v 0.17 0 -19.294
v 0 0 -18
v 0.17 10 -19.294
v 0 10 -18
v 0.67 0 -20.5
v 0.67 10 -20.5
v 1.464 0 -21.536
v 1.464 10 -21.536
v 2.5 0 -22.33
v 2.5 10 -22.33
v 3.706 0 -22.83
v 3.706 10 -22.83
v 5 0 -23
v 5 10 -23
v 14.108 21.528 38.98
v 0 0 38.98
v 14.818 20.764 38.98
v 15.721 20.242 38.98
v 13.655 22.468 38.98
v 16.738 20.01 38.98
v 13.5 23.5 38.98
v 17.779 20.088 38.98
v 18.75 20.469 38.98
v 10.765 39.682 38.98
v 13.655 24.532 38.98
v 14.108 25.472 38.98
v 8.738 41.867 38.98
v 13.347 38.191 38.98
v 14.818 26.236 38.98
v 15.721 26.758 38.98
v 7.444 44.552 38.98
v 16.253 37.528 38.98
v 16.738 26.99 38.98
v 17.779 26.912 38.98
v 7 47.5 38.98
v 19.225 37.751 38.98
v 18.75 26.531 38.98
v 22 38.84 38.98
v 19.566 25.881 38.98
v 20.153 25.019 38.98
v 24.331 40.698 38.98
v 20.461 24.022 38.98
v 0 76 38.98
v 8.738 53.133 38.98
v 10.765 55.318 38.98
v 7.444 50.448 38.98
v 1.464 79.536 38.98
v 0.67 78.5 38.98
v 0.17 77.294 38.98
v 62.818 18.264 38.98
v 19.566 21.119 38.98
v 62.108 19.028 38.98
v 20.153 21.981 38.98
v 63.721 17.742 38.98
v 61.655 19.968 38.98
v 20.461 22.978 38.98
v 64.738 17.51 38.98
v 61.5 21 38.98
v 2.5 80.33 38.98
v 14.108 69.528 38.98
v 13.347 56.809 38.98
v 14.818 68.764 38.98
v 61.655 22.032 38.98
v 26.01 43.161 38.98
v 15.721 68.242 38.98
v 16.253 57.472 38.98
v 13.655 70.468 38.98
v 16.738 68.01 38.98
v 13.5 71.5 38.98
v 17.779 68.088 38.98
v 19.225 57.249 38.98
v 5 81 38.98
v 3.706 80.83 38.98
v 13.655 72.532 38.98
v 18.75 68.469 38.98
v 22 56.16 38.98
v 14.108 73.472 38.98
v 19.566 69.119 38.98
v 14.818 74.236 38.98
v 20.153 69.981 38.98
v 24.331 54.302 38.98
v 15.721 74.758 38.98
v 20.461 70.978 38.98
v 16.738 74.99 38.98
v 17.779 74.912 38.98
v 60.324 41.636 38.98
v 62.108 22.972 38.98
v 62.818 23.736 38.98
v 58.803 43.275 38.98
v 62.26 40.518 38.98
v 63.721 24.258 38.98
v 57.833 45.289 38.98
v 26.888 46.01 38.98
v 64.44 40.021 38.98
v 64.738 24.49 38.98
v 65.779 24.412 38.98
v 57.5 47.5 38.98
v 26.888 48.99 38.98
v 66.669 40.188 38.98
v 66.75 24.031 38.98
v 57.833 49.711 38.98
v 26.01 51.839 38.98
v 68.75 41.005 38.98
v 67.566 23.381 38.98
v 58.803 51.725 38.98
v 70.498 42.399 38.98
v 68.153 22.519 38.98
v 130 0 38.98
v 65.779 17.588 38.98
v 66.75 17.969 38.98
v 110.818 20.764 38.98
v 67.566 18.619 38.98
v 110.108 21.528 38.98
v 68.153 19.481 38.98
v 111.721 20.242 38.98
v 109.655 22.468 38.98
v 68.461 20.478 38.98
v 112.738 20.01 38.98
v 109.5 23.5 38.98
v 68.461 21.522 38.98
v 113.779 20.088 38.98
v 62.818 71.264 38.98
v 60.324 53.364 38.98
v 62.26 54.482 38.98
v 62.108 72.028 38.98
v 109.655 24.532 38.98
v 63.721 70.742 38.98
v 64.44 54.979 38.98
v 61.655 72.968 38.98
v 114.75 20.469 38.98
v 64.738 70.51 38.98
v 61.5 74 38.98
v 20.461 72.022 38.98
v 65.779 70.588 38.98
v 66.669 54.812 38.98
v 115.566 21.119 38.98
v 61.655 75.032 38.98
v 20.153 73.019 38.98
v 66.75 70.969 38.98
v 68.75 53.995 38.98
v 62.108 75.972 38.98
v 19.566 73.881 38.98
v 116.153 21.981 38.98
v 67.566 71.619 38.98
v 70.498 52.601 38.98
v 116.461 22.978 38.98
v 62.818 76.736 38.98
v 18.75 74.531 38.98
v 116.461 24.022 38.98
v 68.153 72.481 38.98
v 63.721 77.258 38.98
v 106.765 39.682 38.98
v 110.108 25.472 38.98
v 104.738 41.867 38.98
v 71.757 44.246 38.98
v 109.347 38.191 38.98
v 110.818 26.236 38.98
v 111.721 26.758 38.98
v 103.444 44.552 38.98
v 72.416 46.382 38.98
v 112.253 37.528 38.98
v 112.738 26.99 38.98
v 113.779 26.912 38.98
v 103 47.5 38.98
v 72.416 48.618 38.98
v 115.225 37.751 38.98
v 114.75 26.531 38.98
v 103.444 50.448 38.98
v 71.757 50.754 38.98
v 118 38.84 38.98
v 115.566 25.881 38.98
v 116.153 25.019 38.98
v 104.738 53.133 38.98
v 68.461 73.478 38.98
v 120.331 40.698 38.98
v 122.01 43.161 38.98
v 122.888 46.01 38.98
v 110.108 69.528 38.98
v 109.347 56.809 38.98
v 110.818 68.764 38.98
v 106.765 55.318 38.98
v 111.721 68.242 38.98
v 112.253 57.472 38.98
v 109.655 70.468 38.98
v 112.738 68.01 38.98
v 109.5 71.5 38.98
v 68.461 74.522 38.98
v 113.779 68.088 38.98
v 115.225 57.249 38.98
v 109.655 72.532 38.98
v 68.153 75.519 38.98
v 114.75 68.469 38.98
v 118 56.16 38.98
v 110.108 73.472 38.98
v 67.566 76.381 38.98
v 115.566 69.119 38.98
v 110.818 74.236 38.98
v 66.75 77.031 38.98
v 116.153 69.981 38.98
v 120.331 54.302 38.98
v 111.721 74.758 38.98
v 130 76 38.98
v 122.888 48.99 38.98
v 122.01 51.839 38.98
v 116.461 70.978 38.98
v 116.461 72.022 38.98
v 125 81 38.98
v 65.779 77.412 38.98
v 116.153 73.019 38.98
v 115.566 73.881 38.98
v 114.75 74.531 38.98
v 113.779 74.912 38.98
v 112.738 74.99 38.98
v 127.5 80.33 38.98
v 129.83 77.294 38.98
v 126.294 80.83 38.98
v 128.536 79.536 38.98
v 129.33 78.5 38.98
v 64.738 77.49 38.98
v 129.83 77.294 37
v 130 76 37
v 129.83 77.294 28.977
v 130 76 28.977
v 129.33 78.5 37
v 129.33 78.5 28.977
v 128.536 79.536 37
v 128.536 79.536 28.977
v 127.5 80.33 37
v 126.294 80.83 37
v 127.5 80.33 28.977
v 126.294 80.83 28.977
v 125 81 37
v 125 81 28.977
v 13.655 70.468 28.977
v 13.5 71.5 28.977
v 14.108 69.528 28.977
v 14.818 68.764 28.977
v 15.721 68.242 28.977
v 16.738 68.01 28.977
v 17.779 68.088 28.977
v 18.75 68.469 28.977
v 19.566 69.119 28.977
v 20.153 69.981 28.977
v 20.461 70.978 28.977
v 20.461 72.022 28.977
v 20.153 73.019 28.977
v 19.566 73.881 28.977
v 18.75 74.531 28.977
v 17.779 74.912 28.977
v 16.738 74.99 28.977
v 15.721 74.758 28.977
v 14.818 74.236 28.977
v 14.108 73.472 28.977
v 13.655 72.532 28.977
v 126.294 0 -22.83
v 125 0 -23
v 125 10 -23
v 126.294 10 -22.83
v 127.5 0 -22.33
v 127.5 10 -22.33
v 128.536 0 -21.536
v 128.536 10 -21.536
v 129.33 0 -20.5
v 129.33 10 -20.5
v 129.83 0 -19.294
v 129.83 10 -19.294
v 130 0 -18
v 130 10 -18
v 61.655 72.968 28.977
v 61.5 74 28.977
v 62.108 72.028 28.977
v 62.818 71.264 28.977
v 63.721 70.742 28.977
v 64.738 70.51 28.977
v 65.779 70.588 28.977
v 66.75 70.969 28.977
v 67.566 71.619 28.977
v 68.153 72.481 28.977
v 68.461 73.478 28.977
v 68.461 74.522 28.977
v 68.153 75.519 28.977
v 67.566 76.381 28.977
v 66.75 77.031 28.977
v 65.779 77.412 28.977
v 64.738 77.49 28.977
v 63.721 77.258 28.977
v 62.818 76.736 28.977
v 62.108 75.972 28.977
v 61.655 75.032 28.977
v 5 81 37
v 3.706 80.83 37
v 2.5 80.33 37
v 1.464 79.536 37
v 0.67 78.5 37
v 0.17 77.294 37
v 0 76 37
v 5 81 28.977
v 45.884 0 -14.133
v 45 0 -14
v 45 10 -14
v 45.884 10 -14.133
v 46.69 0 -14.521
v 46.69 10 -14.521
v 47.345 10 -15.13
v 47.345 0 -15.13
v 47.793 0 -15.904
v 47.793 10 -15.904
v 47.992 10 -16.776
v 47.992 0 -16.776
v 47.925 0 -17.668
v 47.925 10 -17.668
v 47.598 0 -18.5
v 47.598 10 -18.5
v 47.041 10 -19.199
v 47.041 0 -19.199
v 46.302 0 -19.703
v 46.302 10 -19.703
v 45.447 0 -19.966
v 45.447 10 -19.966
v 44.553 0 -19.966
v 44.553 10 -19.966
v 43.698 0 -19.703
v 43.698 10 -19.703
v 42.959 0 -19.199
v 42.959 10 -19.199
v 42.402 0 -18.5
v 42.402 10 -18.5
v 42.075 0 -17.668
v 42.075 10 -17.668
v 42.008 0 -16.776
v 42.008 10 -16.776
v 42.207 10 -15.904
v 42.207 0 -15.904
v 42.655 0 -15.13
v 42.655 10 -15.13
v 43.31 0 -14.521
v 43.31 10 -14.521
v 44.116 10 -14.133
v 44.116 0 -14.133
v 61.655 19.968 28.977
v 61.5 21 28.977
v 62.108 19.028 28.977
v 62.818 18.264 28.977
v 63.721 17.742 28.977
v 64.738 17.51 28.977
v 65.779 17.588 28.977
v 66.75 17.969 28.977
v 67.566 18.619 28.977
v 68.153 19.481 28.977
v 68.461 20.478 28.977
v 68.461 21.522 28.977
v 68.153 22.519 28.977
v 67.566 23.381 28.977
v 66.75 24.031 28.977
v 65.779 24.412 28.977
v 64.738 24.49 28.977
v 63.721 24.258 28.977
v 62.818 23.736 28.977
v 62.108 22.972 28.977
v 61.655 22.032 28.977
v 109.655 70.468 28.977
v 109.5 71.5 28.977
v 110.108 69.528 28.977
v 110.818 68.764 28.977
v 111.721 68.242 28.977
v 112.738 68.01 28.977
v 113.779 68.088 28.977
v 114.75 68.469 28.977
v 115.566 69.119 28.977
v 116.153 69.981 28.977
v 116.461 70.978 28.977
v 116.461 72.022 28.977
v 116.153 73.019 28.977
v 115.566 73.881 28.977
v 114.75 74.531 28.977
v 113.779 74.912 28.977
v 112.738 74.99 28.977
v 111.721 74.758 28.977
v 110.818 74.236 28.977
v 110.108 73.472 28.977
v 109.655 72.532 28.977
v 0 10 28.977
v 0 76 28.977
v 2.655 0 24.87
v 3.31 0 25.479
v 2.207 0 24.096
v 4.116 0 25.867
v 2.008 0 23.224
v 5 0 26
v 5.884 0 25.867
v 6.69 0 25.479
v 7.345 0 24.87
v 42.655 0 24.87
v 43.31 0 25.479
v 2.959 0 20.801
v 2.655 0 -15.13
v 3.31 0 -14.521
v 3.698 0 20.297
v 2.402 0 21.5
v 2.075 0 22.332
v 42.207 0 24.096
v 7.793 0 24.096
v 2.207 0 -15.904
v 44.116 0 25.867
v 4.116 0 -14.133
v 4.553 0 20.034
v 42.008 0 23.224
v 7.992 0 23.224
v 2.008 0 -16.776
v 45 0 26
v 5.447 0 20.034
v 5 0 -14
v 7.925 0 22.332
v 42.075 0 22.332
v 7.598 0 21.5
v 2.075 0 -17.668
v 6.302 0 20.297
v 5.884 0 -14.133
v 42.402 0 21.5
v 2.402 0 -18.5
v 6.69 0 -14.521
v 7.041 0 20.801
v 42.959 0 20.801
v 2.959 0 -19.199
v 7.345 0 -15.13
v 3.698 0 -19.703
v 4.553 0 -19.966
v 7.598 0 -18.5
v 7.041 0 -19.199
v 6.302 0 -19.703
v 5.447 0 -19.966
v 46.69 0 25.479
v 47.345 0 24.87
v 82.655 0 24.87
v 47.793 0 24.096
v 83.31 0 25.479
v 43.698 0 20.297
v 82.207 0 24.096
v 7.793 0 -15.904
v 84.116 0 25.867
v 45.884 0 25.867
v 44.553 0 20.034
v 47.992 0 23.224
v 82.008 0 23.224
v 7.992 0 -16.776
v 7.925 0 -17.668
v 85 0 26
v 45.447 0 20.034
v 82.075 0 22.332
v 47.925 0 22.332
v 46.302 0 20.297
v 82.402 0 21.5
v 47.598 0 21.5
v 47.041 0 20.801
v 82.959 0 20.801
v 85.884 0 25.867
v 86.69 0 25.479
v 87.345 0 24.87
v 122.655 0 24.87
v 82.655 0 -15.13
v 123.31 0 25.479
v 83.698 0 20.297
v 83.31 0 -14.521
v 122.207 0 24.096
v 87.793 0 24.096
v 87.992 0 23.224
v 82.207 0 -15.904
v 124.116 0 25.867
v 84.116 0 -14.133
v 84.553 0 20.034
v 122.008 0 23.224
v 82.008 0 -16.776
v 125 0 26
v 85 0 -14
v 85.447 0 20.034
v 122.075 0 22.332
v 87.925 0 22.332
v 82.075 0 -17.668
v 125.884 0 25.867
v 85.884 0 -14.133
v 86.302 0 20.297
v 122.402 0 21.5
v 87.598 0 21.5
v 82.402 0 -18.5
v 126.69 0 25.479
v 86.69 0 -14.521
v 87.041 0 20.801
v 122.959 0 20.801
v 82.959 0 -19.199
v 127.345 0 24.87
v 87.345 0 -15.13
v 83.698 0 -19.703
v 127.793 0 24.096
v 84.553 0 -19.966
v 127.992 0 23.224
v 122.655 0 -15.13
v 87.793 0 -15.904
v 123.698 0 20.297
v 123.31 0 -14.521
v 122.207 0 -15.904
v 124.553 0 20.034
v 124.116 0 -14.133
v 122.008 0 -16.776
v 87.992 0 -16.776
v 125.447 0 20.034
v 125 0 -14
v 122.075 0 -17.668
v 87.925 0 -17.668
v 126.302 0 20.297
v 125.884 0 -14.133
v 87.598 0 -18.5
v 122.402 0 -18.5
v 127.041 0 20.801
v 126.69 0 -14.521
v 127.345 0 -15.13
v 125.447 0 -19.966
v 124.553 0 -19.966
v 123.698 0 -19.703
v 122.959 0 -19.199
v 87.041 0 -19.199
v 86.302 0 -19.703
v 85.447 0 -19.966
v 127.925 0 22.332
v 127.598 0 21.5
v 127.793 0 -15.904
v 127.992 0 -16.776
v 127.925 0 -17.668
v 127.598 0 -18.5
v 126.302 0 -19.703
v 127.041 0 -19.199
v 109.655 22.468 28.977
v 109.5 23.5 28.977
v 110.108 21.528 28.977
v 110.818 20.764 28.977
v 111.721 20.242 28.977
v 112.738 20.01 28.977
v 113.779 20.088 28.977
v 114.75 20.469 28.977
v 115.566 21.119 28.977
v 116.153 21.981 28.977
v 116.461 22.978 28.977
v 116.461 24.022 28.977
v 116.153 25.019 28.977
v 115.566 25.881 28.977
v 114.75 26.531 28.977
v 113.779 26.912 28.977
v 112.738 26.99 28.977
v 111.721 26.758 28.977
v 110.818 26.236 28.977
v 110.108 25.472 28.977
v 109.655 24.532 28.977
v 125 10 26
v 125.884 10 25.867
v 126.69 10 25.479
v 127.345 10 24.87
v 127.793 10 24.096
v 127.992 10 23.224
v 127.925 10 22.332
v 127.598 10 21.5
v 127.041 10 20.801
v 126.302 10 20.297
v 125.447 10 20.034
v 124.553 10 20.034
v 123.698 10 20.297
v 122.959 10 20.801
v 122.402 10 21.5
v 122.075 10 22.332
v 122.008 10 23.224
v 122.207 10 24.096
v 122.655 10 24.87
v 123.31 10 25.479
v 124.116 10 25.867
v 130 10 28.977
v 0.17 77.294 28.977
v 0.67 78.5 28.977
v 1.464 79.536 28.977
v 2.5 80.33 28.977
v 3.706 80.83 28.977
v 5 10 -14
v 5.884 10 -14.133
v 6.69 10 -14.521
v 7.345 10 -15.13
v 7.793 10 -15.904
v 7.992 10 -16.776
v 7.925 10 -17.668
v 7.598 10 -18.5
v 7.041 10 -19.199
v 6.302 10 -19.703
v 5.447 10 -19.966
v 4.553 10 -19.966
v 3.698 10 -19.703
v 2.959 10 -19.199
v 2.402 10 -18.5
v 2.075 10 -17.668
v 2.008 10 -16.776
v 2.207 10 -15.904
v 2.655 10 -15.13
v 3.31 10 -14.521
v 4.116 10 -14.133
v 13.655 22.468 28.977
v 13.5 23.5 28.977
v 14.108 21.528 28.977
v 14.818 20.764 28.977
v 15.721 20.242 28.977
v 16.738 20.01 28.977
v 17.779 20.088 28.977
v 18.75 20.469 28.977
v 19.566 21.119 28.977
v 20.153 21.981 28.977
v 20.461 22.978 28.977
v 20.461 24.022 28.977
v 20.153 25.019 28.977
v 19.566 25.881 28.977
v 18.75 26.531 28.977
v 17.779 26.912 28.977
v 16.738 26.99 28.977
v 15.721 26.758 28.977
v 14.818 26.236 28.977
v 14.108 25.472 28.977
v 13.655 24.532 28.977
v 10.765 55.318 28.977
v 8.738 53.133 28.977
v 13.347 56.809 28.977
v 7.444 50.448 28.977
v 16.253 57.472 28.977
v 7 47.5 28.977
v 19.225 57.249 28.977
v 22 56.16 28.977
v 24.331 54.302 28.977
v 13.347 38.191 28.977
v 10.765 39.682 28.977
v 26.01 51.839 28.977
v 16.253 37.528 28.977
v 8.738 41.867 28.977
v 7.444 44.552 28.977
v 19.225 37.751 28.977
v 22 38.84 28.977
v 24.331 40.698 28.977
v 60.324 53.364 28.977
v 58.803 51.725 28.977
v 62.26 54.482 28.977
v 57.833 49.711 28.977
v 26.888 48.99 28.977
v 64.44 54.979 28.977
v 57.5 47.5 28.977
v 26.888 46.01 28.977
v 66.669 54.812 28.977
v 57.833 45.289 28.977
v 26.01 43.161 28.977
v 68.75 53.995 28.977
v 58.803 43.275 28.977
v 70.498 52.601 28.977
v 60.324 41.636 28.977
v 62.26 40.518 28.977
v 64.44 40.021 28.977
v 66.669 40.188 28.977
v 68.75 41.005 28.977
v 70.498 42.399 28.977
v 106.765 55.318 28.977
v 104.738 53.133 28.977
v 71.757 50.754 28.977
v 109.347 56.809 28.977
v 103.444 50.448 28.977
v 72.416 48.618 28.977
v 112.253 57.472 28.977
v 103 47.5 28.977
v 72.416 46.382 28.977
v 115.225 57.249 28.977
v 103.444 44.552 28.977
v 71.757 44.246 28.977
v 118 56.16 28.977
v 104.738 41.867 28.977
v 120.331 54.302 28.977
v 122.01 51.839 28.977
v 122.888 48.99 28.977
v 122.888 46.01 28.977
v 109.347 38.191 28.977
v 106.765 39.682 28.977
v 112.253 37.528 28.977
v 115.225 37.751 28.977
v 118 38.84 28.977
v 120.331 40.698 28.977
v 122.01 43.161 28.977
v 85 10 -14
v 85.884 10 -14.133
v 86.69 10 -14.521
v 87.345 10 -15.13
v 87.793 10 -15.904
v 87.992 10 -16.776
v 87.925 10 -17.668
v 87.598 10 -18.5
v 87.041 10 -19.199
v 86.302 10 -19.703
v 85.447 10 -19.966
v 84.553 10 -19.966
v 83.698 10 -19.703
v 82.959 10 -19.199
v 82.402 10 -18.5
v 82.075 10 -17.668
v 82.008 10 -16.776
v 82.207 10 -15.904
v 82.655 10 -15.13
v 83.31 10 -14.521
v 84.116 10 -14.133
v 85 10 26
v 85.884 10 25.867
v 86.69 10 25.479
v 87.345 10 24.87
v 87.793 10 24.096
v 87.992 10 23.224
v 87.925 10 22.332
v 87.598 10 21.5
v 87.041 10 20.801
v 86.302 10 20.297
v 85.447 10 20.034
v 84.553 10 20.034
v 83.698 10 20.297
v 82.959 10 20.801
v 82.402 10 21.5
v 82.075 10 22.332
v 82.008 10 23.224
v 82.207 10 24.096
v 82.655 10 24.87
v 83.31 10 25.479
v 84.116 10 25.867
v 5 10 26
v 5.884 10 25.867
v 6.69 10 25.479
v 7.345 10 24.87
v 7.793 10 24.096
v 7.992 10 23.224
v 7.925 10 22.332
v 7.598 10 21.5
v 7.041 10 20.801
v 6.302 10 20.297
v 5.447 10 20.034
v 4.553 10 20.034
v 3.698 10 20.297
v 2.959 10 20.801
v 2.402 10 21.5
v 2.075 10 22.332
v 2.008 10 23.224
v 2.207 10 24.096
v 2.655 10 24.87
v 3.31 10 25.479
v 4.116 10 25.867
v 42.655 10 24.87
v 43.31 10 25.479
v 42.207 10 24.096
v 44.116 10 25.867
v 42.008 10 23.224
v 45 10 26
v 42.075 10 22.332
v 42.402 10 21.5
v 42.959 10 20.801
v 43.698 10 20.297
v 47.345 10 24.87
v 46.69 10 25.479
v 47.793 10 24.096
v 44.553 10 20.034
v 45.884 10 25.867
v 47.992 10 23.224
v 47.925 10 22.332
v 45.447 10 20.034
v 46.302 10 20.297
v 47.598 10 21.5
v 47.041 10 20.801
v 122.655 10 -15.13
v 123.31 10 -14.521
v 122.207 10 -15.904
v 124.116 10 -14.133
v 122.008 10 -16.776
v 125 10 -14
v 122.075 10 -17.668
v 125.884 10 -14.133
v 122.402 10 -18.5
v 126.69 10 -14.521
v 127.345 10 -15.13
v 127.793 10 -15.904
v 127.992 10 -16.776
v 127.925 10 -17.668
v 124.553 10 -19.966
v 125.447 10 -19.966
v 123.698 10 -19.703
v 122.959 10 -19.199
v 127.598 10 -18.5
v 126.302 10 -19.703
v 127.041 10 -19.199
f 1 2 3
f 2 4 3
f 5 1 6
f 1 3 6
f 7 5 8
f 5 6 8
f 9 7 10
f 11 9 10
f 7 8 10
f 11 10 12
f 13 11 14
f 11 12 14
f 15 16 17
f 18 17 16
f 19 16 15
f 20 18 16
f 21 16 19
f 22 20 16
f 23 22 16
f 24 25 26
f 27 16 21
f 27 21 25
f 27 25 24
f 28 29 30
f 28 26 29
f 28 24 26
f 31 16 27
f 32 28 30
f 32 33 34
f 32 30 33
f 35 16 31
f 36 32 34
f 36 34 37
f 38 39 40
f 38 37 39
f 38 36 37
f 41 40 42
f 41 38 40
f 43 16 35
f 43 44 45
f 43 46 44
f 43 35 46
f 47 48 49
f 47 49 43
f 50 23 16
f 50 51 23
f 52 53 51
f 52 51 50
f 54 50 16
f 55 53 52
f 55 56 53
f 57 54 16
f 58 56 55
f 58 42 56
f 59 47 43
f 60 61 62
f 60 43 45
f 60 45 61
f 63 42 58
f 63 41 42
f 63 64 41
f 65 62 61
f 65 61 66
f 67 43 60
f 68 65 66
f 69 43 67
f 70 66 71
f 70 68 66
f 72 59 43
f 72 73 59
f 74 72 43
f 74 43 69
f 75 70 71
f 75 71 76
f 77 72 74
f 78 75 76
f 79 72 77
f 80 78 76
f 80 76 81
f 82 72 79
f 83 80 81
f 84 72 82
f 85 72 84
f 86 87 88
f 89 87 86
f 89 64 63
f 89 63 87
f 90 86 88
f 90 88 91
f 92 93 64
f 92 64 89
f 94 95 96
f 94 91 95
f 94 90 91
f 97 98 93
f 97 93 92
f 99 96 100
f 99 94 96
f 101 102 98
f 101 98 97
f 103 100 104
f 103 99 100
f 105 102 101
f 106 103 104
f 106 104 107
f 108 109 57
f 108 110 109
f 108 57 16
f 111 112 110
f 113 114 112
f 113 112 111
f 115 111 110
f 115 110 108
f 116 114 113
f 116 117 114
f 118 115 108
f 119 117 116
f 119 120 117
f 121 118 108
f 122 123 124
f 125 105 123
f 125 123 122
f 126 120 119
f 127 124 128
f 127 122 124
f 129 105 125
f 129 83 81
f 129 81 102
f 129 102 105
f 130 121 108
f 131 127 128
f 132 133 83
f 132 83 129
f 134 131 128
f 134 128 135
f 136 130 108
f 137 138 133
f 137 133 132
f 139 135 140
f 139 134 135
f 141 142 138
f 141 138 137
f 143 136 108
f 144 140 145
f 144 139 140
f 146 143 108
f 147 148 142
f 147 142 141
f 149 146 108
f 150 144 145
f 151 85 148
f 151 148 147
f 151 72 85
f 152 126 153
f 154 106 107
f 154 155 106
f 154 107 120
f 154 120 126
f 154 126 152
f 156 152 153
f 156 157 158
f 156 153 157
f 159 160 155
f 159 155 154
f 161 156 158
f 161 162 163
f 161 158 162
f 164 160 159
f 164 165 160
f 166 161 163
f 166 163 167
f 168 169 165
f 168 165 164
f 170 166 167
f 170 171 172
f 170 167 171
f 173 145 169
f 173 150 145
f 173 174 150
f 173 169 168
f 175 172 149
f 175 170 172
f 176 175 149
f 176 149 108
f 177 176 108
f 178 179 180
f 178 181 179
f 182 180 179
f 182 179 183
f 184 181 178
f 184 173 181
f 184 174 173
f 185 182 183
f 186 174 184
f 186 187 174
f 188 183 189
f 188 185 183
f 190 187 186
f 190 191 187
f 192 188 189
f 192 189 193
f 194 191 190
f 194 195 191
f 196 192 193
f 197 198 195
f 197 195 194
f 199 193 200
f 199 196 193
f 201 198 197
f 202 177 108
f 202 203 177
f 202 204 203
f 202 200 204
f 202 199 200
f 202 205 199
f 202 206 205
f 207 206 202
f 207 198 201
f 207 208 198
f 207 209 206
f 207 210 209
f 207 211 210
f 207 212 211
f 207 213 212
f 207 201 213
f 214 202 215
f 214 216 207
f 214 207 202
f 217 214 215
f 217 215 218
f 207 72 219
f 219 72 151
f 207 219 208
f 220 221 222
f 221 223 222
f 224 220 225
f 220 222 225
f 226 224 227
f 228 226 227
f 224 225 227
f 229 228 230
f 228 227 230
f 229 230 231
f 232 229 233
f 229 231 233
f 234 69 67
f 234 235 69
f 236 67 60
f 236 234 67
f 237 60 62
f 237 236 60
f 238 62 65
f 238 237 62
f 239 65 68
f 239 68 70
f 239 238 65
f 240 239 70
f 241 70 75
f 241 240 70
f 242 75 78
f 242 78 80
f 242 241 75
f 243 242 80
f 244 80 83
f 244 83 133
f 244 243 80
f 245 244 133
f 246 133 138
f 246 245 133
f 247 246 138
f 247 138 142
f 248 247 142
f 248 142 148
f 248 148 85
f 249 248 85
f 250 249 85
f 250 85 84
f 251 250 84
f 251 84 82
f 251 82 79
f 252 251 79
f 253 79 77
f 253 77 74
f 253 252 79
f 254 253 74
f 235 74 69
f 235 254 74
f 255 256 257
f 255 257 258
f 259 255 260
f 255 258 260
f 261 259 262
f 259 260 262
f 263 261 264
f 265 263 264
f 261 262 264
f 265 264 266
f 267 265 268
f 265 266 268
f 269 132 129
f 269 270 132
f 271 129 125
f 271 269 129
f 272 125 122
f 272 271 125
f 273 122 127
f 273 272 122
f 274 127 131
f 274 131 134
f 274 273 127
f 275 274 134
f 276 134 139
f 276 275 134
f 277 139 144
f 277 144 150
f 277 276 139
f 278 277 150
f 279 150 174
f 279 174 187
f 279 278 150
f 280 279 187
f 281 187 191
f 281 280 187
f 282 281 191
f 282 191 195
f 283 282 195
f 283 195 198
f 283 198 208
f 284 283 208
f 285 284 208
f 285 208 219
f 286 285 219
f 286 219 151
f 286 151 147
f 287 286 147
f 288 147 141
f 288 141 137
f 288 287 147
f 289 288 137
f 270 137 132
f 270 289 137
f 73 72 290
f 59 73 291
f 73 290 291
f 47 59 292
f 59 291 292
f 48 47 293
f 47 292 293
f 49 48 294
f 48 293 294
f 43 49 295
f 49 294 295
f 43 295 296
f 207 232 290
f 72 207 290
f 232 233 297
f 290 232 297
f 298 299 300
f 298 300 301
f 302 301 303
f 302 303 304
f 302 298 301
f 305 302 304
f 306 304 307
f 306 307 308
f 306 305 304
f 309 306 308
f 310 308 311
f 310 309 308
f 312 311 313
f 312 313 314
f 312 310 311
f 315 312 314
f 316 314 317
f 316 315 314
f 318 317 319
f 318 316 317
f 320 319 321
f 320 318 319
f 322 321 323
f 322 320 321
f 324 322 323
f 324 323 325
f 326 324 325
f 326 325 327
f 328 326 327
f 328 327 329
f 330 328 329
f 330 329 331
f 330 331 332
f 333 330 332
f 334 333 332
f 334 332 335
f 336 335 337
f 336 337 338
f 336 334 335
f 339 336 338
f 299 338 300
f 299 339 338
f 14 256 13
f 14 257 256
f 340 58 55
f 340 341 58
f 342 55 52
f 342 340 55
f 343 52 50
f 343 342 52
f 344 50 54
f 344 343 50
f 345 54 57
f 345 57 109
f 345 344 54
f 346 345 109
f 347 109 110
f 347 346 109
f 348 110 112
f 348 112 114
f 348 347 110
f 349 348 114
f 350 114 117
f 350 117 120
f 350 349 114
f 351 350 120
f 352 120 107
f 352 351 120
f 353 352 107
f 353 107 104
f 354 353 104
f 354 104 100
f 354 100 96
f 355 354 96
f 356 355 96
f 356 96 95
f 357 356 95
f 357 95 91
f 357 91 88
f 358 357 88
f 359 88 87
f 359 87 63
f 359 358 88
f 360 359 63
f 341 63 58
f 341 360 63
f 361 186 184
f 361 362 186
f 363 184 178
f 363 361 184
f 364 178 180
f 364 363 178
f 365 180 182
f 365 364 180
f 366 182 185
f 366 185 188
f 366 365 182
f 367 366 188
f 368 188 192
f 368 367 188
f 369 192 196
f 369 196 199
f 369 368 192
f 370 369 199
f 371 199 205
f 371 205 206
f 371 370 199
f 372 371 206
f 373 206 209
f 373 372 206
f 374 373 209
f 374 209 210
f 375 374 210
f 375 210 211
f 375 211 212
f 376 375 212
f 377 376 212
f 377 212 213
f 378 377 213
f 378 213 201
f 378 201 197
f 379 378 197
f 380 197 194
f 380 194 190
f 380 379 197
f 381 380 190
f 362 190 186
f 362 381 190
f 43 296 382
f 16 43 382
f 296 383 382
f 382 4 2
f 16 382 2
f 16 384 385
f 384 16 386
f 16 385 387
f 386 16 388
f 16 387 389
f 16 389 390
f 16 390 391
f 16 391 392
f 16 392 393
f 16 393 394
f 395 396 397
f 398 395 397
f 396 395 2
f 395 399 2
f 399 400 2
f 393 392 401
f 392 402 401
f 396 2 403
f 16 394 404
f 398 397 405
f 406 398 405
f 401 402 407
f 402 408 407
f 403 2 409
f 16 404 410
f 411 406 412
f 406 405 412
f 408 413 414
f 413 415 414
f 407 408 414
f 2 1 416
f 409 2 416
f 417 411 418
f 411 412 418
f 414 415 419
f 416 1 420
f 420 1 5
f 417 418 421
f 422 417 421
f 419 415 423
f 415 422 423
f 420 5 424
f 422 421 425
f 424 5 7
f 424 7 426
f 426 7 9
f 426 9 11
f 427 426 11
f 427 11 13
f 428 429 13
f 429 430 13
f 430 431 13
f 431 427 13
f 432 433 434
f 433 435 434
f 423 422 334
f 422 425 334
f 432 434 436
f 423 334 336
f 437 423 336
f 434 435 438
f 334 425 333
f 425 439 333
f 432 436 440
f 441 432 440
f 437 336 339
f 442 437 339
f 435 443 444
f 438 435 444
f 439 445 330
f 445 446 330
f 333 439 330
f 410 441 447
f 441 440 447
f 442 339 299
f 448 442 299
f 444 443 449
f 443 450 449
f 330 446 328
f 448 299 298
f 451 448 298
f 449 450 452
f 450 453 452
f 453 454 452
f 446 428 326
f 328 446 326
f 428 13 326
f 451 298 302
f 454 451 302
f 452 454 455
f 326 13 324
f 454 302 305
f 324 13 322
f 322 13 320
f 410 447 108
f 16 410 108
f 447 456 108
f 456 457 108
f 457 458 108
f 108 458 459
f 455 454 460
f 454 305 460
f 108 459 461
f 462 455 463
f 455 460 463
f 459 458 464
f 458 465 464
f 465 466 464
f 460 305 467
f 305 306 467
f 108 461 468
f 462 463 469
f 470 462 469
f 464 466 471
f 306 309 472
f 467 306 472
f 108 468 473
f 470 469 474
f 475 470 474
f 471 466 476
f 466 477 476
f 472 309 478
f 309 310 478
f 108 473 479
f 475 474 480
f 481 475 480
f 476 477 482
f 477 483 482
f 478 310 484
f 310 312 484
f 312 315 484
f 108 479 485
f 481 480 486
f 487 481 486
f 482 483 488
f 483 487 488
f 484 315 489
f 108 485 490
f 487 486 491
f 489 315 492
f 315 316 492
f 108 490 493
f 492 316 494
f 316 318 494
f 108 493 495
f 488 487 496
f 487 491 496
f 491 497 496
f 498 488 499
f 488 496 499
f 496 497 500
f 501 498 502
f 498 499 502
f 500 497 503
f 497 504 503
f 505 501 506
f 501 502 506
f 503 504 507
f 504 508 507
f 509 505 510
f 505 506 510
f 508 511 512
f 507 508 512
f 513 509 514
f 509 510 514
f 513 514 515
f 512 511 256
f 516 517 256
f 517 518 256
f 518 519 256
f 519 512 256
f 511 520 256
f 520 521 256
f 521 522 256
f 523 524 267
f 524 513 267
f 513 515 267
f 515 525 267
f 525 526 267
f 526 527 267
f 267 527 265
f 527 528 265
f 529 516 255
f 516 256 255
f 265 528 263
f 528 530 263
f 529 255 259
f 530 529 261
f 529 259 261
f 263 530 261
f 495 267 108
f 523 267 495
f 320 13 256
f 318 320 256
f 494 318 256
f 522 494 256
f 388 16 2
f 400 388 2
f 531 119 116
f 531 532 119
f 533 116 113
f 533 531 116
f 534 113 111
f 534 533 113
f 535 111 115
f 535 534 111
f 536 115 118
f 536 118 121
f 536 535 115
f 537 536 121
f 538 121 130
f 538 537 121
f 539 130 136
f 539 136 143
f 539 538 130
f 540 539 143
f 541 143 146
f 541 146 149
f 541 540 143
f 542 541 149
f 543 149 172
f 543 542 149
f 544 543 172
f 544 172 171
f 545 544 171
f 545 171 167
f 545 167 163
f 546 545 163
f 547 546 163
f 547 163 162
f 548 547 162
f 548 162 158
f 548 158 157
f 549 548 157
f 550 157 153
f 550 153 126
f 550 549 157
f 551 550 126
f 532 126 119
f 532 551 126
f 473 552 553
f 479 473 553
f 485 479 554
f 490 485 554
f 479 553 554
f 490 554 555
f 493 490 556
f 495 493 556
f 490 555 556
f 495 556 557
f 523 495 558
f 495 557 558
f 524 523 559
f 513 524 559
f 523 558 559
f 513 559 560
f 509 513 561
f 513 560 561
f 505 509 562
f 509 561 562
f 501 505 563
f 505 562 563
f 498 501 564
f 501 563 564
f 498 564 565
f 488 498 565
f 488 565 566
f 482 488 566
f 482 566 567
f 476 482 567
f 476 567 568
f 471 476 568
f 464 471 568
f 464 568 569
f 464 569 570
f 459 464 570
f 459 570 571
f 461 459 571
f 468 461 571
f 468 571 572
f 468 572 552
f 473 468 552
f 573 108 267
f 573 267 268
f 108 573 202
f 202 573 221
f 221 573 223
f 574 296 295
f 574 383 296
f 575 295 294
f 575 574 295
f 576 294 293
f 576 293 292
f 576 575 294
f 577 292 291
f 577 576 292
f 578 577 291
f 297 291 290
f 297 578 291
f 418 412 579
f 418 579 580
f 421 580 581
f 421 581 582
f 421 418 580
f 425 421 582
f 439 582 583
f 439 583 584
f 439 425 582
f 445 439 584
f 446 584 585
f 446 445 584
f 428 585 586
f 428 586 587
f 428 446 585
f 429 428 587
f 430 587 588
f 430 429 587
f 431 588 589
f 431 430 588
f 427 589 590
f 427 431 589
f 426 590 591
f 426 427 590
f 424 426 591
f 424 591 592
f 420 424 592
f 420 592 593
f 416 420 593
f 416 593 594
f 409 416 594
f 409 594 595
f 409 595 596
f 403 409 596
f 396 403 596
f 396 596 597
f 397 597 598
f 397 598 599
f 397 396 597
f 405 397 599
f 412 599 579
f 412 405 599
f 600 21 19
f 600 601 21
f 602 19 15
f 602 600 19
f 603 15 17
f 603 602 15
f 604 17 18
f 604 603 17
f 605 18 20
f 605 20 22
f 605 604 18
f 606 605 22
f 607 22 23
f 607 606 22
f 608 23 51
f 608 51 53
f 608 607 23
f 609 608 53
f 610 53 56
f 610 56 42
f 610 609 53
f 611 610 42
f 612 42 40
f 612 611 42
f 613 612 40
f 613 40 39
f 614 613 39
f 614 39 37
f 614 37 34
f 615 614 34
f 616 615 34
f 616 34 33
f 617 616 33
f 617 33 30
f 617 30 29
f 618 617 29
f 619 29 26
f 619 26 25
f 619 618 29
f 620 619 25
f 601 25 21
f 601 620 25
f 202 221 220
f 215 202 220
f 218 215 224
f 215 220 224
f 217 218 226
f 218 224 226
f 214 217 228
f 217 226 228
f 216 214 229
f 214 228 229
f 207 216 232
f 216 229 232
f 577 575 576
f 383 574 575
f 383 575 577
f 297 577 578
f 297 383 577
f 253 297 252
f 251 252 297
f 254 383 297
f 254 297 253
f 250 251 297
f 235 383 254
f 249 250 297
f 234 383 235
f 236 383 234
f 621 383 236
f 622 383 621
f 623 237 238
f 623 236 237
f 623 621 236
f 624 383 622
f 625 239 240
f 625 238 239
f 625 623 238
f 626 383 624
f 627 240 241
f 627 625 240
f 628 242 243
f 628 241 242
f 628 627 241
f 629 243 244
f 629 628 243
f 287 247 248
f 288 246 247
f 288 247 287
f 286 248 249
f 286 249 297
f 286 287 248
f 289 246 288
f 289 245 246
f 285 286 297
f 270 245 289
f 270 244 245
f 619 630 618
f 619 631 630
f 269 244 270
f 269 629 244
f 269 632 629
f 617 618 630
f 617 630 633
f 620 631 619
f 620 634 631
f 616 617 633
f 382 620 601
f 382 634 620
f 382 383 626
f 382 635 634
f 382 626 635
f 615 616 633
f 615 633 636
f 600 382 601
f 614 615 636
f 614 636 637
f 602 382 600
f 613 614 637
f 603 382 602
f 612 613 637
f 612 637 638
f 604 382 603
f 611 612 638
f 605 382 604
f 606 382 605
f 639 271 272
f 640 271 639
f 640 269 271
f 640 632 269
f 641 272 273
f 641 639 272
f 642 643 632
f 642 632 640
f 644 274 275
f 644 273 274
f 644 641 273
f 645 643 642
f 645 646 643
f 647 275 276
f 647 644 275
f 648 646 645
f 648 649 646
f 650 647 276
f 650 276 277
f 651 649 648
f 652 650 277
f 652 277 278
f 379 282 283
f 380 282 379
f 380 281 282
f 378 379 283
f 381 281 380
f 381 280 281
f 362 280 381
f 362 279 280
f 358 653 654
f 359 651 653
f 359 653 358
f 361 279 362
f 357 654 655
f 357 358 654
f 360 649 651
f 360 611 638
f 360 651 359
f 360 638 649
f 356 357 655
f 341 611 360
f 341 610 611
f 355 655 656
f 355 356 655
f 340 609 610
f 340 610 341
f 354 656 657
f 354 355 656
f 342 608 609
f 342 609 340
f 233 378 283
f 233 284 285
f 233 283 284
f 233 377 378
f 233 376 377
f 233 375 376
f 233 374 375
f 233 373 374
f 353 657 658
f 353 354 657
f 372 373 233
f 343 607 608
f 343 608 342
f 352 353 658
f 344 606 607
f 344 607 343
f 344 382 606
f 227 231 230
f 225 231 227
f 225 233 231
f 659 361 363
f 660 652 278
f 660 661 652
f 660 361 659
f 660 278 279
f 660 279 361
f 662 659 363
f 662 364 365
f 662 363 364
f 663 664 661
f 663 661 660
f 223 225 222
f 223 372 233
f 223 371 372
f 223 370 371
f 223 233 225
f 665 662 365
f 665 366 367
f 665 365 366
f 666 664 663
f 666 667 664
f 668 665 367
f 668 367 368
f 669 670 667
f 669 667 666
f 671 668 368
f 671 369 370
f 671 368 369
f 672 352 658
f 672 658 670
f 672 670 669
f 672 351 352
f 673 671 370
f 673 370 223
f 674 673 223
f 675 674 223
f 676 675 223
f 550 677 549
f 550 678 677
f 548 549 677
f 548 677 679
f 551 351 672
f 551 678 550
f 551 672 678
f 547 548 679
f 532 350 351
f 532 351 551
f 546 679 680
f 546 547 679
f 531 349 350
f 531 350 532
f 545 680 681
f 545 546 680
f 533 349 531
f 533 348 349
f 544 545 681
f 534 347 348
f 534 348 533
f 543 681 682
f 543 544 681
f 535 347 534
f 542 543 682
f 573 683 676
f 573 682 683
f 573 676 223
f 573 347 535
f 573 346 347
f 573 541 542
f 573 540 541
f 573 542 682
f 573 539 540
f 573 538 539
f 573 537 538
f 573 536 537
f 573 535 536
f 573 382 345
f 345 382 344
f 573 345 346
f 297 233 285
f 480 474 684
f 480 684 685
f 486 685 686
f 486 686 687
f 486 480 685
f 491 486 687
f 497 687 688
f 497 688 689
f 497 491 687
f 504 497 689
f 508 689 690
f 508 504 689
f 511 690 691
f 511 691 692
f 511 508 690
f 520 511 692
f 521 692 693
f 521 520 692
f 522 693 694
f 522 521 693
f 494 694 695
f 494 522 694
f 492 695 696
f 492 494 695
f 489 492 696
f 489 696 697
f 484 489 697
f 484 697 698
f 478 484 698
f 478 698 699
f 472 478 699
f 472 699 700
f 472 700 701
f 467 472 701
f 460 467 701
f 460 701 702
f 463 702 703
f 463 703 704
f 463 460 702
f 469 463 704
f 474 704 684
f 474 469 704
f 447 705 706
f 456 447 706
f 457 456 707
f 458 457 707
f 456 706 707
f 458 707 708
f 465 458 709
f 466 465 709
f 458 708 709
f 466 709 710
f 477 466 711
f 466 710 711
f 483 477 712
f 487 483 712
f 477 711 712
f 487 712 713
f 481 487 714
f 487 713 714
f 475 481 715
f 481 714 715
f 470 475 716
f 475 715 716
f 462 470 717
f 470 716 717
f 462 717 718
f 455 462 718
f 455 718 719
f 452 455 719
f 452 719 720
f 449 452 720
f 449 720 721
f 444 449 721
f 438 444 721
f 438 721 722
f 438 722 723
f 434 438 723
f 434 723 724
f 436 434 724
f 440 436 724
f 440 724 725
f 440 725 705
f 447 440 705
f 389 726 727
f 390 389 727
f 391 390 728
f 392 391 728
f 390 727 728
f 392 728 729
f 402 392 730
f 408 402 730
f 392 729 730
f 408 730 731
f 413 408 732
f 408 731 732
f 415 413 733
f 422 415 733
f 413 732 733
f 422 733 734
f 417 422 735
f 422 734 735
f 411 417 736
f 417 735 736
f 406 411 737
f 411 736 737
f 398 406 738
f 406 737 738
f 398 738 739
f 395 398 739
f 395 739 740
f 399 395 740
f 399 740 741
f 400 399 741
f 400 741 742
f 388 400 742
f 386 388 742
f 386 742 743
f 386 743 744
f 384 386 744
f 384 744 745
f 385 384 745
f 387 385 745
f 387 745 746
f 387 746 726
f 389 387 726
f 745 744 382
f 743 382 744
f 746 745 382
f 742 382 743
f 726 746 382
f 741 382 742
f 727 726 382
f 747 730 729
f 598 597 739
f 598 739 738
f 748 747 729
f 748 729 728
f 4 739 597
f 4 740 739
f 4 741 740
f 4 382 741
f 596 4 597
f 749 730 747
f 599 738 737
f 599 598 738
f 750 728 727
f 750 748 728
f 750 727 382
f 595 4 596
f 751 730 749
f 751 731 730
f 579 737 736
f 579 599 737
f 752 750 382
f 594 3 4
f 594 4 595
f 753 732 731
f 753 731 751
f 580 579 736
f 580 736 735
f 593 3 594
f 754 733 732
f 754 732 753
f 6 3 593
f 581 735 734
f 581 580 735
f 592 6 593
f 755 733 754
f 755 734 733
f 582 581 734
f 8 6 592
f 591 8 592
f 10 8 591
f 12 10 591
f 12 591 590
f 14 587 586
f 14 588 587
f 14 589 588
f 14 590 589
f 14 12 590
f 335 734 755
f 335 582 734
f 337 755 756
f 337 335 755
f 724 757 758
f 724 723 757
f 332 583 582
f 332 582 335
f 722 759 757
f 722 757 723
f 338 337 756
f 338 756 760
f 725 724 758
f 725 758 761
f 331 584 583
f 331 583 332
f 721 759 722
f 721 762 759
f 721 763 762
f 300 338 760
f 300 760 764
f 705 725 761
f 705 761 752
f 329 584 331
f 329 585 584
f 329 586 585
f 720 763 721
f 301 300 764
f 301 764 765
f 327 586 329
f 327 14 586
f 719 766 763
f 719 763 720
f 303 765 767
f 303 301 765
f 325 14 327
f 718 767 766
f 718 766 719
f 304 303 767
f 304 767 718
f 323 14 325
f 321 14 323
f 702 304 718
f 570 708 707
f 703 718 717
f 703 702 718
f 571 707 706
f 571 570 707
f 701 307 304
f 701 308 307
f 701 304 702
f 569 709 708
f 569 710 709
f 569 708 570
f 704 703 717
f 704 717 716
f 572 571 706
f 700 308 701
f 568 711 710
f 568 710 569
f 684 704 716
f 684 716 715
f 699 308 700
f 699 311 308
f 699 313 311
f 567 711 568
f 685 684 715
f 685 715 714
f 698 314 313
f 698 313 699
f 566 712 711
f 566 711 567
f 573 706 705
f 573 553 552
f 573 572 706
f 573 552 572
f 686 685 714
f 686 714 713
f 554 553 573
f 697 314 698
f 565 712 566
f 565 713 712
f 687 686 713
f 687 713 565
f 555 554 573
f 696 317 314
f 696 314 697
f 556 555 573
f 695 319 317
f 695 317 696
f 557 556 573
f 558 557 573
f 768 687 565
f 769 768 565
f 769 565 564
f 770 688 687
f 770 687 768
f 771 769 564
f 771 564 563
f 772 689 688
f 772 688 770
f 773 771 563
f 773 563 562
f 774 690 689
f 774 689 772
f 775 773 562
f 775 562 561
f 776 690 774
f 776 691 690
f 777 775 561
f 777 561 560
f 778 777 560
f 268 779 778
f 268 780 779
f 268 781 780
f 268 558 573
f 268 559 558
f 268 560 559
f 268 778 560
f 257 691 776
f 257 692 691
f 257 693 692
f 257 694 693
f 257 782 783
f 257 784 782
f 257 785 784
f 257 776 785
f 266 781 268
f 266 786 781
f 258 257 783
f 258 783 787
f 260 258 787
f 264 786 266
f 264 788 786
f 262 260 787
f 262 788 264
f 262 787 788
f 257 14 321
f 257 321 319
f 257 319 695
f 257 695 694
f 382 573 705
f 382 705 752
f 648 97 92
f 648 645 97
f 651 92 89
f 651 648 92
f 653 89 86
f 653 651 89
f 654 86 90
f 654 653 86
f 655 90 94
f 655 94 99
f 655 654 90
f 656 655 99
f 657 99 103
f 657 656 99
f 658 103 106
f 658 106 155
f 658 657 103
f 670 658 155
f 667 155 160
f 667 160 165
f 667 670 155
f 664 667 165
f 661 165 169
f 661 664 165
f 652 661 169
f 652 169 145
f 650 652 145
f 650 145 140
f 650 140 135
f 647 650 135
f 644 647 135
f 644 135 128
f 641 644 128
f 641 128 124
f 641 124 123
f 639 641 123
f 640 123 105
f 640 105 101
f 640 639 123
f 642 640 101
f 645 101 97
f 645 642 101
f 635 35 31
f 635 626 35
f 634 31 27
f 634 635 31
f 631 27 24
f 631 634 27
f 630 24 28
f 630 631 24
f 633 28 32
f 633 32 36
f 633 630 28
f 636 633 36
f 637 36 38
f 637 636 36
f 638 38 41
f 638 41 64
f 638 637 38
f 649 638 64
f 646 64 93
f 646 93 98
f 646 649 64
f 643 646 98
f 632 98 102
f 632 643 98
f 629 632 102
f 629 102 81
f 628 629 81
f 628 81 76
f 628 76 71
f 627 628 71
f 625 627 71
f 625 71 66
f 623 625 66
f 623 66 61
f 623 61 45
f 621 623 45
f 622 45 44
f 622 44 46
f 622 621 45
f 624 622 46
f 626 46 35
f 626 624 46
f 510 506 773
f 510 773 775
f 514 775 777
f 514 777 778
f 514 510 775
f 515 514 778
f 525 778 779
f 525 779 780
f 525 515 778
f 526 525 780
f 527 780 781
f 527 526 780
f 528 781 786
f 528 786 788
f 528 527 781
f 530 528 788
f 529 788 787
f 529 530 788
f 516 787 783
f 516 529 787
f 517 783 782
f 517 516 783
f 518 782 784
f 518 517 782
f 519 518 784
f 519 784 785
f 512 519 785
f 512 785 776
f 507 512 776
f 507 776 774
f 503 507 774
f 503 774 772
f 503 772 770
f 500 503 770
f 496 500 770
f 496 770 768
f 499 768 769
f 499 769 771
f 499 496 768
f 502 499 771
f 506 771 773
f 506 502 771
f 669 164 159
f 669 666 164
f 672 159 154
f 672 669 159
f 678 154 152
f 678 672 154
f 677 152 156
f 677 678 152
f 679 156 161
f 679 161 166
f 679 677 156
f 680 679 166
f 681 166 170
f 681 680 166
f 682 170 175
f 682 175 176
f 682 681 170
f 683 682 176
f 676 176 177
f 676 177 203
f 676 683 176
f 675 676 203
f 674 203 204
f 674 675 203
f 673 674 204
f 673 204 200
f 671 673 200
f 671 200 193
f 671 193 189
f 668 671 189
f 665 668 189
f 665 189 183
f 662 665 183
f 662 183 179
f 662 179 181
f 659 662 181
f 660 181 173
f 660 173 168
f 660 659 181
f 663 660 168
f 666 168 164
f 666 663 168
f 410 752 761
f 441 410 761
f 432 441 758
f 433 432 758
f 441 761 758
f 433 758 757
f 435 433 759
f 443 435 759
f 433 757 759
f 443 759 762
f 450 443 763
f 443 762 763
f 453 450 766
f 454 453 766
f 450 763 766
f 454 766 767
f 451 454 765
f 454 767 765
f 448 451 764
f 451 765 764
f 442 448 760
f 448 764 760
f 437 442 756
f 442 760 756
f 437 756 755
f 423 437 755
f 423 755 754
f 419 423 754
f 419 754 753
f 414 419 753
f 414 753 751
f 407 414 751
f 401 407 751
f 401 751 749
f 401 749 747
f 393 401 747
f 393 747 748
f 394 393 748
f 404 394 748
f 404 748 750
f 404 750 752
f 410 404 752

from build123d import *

# Parameters (mm, degrees)
SKETCH1_R           = 3
SKETCH1_W           = 130
SKETCH1_H           = 10
BOSS_EXTRUDE1_DEPTH = 10
SKETCH2_W           = 130
SKETCH2_H           = 8.023003322
BOSS_EXTRUDE2_DEPTH = 75
SKETCH3_R           = 7.5
SKETCH3_R_2         = 3.5
SKETCH3_R_3         = 10
CUT_EXTRUDE1_DEPTH  = 75
SKETCH4_R           = 3.5
BOSS_EXTRUDE3_DEPTH = 10
SKETCH5_R           = 3.5
CUT_EXTRUDE2_DEPTH  = 10
SKETCH7_W           = 130
SKETCH7_H           = 8.023003322
CUT_EXTRUDE3_DEPTH  = 4
FILLET2_R           = 5
SKETCH8_W           = 4.676136813
SKETCH8_H           = 81
CUT_EXTRUDE4_DEPTH  = 500
SKETCH9_R           = 3
CUT_EXTRUDE5_DEPTH  = 500
SKETCH11_W          = 130
SKETCH11_H          = 10
CUT_EXTRUDE6_DEPTH  = 40
FILLET3_R           = 5
FILLET4_R           = 5
SKETCH12_R          = 3.5
SKETCH12_R_2        = 10
SKETCH12_R_3        = 7.5
BOSS_EXTRUDE4_DEPTH = 1.98


with BuildPart() as part:
    # Sketch1 → Boss-Extrude1 (new body)
    # profile 1 of 3: a face of its own
    with BuildSketch(Plane(origin=(0, 0, 0), x_dir=(1, 0, 0), z_dir=(0, 1, 0))):
        Polygon((0, 63), (0, 0), (5, 0), (130, 0), (130, 63), align=None)
        with Locations(Location((5, 17, 0), (0, 0, 270))):
            Circle(SKETCH1_R, mode=Mode.SUBTRACT)
        with Locations(Location((45, 17, 0), (0, 0, 270))):
            Circle(SKETCH1_R, mode=Mode.SUBTRACT)
        with Locations(Location((5, 57, 0), (0, 0, 270))):
            Circle(SKETCH1_R, mode=Mode.SUBTRACT)
        with Locations(Location((45, 57, 0), (0, 0, 270))):
            Circle(SKETCH1_R, mode=Mode.SUBTRACT)
        with Locations(Location((85, 17, 0), (0, 0, 270))):
            Circle(SKETCH1_R, mode=Mode.SUBTRACT)
        with Locations(Location((125, 17, 0), (0, 0, 270))):
            Circle(SKETCH1_R, mode=Mode.SUBTRACT)
        with Locations(Location((85, 57, 0), (0, 0, 270))):
            Circle(SKETCH1_R, mode=Mode.SUBTRACT)
        with Locations(Location((125, 57, 0), (0, 0, 270))):
            Circle(SKETCH1_R, mode=Mode.SUBTRACT)
    # profile 2 of 3: a face of its own
    with BuildSketch(Plane(origin=(0, 0, 0), x_dir=(1, 0, 0), z_dir=(0, 1, 0))):
        Polygon((5, 0), (0, 0), (0, -27), (130, -27), (130, 0), align=None)
    # profile 3 of 3: a face of its own
    with BuildSketch(Plane(origin=(0, 0, 0), x_dir=(1, 0, 0), z_dir=(0, 1, 0))):
        with Locations((65, -32)):
            Rectangle(SKETCH1_W, SKETCH1_H)
    extrude(amount=BOSS_EXTRUDE1_DEPTH)

    # Sketch2 → Boss-Extrude2 (add)
    with BuildSketch(Plane(origin=(0, 10, 0), x_dir=(1, 0, 0), z_dir=(0, 1, 0))):
        with Locations((65, -32.988498339)):
            Rectangle(SKETCH2_W, SKETCH2_H)
    extrude(amount=BOSS_EXTRUDE2_DEPTH)

    # Sketch3 → Cut-Extrude1 (cut)
    with BuildSketch(Plane(origin=(0, 0, 28.976996678), x_dir=(-1, 0, 0), z_dir=(0, 0, -1))):
        with Locations((-65, 47.5)):
            Circle(SKETCH3_R)
        with Locations((-65, 74)):
            Circle(SKETCH3_R_2)
        with Locations((-17, 71.4)):
            Circle(SKETCH3_R_2)
        with Locations((-17, 23.6)):
            Circle(SKETCH3_R_2)
        with Locations((-17, 47.5)):
            Circle(SKETCH3_R_3)
        with Locations((-65, 21)):
            Circle(SKETCH3_R_2)
        with Locations((-113, 23.6)):
            Circle(SKETCH3_R_2)
        with Locations((-113, 71.4)):
            Circle(SKETCH3_R_2)
        with Locations((-113, 47.5)):
            Circle(SKETCH3_R_3)
    extrude(amount=-CUT_EXTRUDE1_DEPTH, mode=Mode.SUBTRACT)

    # Sketch4 → Boss-Extrude3 (add)
    with BuildSketch(Plane(origin=(0, 0, 28.976996678), x_dir=(-1, 0, 0), z_dir=(0, 0, -1))):
        with Locations((-17, 71.4)):
            Circle(SKETCH4_R)
        with Locations((-17, 23.6)):
            Circle(SKETCH4_R)
        with Locations((-113, 71.4)):
            Circle(SKETCH4_R)
        with Locations((-113, 23.6)):
            Circle(SKETCH4_R)
        with Locations((-65, 74)):
            Circle(SKETCH4_R)
        with Locations((-65, 21)):
            Circle(SKETCH4_R)
    extrude(amount=-BOSS_EXTRUDE3_DEPTH)

    # Sketch5 → Cut-Extrude2 (cut)
    with BuildSketch(Plane(origin=(0, 0, 28.976996678), x_dir=(-1, 0, 0), z_dir=(0, 0, -1))):
        with Locations((-113, 71.5)):
            Circle(SKETCH5_R)
        with Locations((-113, 23.5)):
            Circle(SKETCH5_R)
        with Locations((-17, 71.5)):
            Circle(SKETCH5_R)
        with Locations((-17, 23.5)):
            Circle(SKETCH5_R)
        with Locations((-65, 74)):
            Circle(SKETCH5_R)
        with Locations((-65, 21)):
            Circle(SKETCH5_R)
    extrude(amount=-CUT_EXTRUDE2_DEPTH, mode=Mode.SUBTRACT)

    # Sketch7 → Cut-Extrude3 (cut)
    with BuildSketch(Plane(origin=(0, 85, 0), x_dir=(1, 0, 0), z_dir=(0, 1, 0))):
        with Locations((65, -32.988498339)):
            Rectangle(SKETCH7_W, SKETCH7_H)
    extrude(amount=-CUT_EXTRUDE3_DEPTH, mode=Mode.SUBTRACT)

    # Fillet2
    fillet2_edges = [part.edges().sort_by_distance(p)[0] for p in [
        (130, 5, -63),
        (0, 5, -63),
        (0, 81, 32.988498339),
        (130, 81, 32.988498339),
    ]]
    fillet(fillet2_edges, radius=FILLET2_R)

    # Sketch8 → Cut-Extrude4 (cut)
    with BuildSketch(Plane.ZY):
        with Locations((39.338068406, 40.5)):
            Rectangle(SKETCH8_W, SKETCH8_H)
    extrude(amount=-CUT_EXTRUDE4_DEPTH, mode=Mode.SUBTRACT)

    # Sketch9 → Cut-Extrude5 (cut)
    with BuildSketch(Plane(origin=(0, 10, 0), x_dir=(1, 0, 0), z_dir=(0, 1, 0))):
        with Locations(Location((5, -23, 0), (0, 0, 270))):
            Circle(SKETCH9_R)
        with Locations(Location((45, -23, 0), (0, 0, 270))):
            Circle(SKETCH9_R)
        with Locations(Location((85, -23, 0), (0, 0, 270))):
            Circle(SKETCH9_R)
        with Locations(Location((125, -23, 0), (0, 0, 270))):
            Circle(SKETCH9_R)
    extrude(amount=-CUT_EXTRUDE5_DEPTH, mode=Mode.SUBTRACT)

    # Sketch11 → Cut-Extrude6 (cut)
    with BuildSketch(Plane(origin=(0, 0, -63), x_dir=(-1, 0, 0), z_dir=(0, 0, -1))):
        with Locations((-65, 5)):
            Rectangle(SKETCH11_W, SKETCH11_H)
    extrude(amount=-CUT_EXTRUDE6_DEPTH, mode=Mode.SUBTRACT)

    # Fillet3
    fillet3_edges = [part.edges().sort_by_distance(p)[0] for p in [
        (0, 5, -23),
    ]]
    fillet(fillet3_edges, radius=FILLET3_R)

    # Fillet4
    fillet4_edges = [part.edges().sort_by_distance(p)[0] for p in [
        (130, 5, -23),
    ]]
    fillet(fillet4_edges, radius=FILLET4_R)

    # Sketch12 → Boss-Extrude4 (add)
    # profile 1 of 3: a face of its own
    with BuildSketch(Plane.XY.offset(37)):
        with BuildLine():
            Line((125, 81), (5, 81))
            ThreePointArc((5, 81), (8.535533906, 79.535533906), (10, 76))
            ThreePointArc((10, 76), (5, 71), (0, 76))
            Line((0, 76), (0, 0))
            Line((0, 0), (130, 0))
            Line((130, 0), (130, 76))
            ThreePointArc((130, 76), (121.464466094, 72.464466094), (125, 81))
        make_face()
        with Locations(Location((17, 23.5, 0), (0, 0, 180))):
            Circle(SKETCH12_R, mode=Mode.SUBTRACT)
        with Locations(Location((65, 21, 0), (0, 0, 180))):
            Circle(SKETCH12_R, mode=Mode.SUBTRACT)
        with Locations(Location((113, 23.5, 0), (0, 0, 180))):
            Circle(SKETCH12_R, mode=Mode.SUBTRACT)
        with Locations(Location((17, 47.5, 0), (0, 0, 180))):
            Circle(SKETCH12_R_2, mode=Mode.SUBTRACT)
        with Locations(Location((17, 71.5, 0), (0, 0, 180))):
            Circle(SKETCH12_R, mode=Mode.SUBTRACT)
        with Locations(Location((65, 47.5, 0), (0, 0, 180))):
            Circle(SKETCH12_R_3, mode=Mode.SUBTRACT)
        with Locations(Location((113, 47.5, 0), (0, 0, 180))):
            Circle(SKETCH12_R_2, mode=Mode.SUBTRACT)
        with Locations(Location((65, 74, 0), (0, 0, 180))):
            Circle(SKETCH12_R, mode=Mode.SUBTRACT)
        with Locations(Location((113, 71.5, 0), (0, 0, 180))):
            Circle(SKETCH12_R, mode=Mode.SUBTRACT)
    # profile 2 of 3: a face of its own
    with BuildSketch(Plane.XY.offset(37)):
        with BuildLine():
            ThreePointArc((10, 76), (8.535533906, 79.535533906), (5, 81))
            ThreePointArc((5, 81), (1.464466094, 79.535533906), (0, 76))
            ThreePointArc((0, 76), (5, 71), (10, 76))
        make_face()
    # profile 3 of 3: a face of its own
    with BuildSketch(Plane.XY.offset(37)):
        with BuildLine():
            ThreePointArc((130, 76), (128.535533906, 79.535533906), (125, 81))
            ThreePointArc((125, 81), (121.464466094, 72.464466094), (130, 76))
        make_face()
    extrude(amount=BOSS_EXTRUDE4_DEPTH)


solid = part.part
